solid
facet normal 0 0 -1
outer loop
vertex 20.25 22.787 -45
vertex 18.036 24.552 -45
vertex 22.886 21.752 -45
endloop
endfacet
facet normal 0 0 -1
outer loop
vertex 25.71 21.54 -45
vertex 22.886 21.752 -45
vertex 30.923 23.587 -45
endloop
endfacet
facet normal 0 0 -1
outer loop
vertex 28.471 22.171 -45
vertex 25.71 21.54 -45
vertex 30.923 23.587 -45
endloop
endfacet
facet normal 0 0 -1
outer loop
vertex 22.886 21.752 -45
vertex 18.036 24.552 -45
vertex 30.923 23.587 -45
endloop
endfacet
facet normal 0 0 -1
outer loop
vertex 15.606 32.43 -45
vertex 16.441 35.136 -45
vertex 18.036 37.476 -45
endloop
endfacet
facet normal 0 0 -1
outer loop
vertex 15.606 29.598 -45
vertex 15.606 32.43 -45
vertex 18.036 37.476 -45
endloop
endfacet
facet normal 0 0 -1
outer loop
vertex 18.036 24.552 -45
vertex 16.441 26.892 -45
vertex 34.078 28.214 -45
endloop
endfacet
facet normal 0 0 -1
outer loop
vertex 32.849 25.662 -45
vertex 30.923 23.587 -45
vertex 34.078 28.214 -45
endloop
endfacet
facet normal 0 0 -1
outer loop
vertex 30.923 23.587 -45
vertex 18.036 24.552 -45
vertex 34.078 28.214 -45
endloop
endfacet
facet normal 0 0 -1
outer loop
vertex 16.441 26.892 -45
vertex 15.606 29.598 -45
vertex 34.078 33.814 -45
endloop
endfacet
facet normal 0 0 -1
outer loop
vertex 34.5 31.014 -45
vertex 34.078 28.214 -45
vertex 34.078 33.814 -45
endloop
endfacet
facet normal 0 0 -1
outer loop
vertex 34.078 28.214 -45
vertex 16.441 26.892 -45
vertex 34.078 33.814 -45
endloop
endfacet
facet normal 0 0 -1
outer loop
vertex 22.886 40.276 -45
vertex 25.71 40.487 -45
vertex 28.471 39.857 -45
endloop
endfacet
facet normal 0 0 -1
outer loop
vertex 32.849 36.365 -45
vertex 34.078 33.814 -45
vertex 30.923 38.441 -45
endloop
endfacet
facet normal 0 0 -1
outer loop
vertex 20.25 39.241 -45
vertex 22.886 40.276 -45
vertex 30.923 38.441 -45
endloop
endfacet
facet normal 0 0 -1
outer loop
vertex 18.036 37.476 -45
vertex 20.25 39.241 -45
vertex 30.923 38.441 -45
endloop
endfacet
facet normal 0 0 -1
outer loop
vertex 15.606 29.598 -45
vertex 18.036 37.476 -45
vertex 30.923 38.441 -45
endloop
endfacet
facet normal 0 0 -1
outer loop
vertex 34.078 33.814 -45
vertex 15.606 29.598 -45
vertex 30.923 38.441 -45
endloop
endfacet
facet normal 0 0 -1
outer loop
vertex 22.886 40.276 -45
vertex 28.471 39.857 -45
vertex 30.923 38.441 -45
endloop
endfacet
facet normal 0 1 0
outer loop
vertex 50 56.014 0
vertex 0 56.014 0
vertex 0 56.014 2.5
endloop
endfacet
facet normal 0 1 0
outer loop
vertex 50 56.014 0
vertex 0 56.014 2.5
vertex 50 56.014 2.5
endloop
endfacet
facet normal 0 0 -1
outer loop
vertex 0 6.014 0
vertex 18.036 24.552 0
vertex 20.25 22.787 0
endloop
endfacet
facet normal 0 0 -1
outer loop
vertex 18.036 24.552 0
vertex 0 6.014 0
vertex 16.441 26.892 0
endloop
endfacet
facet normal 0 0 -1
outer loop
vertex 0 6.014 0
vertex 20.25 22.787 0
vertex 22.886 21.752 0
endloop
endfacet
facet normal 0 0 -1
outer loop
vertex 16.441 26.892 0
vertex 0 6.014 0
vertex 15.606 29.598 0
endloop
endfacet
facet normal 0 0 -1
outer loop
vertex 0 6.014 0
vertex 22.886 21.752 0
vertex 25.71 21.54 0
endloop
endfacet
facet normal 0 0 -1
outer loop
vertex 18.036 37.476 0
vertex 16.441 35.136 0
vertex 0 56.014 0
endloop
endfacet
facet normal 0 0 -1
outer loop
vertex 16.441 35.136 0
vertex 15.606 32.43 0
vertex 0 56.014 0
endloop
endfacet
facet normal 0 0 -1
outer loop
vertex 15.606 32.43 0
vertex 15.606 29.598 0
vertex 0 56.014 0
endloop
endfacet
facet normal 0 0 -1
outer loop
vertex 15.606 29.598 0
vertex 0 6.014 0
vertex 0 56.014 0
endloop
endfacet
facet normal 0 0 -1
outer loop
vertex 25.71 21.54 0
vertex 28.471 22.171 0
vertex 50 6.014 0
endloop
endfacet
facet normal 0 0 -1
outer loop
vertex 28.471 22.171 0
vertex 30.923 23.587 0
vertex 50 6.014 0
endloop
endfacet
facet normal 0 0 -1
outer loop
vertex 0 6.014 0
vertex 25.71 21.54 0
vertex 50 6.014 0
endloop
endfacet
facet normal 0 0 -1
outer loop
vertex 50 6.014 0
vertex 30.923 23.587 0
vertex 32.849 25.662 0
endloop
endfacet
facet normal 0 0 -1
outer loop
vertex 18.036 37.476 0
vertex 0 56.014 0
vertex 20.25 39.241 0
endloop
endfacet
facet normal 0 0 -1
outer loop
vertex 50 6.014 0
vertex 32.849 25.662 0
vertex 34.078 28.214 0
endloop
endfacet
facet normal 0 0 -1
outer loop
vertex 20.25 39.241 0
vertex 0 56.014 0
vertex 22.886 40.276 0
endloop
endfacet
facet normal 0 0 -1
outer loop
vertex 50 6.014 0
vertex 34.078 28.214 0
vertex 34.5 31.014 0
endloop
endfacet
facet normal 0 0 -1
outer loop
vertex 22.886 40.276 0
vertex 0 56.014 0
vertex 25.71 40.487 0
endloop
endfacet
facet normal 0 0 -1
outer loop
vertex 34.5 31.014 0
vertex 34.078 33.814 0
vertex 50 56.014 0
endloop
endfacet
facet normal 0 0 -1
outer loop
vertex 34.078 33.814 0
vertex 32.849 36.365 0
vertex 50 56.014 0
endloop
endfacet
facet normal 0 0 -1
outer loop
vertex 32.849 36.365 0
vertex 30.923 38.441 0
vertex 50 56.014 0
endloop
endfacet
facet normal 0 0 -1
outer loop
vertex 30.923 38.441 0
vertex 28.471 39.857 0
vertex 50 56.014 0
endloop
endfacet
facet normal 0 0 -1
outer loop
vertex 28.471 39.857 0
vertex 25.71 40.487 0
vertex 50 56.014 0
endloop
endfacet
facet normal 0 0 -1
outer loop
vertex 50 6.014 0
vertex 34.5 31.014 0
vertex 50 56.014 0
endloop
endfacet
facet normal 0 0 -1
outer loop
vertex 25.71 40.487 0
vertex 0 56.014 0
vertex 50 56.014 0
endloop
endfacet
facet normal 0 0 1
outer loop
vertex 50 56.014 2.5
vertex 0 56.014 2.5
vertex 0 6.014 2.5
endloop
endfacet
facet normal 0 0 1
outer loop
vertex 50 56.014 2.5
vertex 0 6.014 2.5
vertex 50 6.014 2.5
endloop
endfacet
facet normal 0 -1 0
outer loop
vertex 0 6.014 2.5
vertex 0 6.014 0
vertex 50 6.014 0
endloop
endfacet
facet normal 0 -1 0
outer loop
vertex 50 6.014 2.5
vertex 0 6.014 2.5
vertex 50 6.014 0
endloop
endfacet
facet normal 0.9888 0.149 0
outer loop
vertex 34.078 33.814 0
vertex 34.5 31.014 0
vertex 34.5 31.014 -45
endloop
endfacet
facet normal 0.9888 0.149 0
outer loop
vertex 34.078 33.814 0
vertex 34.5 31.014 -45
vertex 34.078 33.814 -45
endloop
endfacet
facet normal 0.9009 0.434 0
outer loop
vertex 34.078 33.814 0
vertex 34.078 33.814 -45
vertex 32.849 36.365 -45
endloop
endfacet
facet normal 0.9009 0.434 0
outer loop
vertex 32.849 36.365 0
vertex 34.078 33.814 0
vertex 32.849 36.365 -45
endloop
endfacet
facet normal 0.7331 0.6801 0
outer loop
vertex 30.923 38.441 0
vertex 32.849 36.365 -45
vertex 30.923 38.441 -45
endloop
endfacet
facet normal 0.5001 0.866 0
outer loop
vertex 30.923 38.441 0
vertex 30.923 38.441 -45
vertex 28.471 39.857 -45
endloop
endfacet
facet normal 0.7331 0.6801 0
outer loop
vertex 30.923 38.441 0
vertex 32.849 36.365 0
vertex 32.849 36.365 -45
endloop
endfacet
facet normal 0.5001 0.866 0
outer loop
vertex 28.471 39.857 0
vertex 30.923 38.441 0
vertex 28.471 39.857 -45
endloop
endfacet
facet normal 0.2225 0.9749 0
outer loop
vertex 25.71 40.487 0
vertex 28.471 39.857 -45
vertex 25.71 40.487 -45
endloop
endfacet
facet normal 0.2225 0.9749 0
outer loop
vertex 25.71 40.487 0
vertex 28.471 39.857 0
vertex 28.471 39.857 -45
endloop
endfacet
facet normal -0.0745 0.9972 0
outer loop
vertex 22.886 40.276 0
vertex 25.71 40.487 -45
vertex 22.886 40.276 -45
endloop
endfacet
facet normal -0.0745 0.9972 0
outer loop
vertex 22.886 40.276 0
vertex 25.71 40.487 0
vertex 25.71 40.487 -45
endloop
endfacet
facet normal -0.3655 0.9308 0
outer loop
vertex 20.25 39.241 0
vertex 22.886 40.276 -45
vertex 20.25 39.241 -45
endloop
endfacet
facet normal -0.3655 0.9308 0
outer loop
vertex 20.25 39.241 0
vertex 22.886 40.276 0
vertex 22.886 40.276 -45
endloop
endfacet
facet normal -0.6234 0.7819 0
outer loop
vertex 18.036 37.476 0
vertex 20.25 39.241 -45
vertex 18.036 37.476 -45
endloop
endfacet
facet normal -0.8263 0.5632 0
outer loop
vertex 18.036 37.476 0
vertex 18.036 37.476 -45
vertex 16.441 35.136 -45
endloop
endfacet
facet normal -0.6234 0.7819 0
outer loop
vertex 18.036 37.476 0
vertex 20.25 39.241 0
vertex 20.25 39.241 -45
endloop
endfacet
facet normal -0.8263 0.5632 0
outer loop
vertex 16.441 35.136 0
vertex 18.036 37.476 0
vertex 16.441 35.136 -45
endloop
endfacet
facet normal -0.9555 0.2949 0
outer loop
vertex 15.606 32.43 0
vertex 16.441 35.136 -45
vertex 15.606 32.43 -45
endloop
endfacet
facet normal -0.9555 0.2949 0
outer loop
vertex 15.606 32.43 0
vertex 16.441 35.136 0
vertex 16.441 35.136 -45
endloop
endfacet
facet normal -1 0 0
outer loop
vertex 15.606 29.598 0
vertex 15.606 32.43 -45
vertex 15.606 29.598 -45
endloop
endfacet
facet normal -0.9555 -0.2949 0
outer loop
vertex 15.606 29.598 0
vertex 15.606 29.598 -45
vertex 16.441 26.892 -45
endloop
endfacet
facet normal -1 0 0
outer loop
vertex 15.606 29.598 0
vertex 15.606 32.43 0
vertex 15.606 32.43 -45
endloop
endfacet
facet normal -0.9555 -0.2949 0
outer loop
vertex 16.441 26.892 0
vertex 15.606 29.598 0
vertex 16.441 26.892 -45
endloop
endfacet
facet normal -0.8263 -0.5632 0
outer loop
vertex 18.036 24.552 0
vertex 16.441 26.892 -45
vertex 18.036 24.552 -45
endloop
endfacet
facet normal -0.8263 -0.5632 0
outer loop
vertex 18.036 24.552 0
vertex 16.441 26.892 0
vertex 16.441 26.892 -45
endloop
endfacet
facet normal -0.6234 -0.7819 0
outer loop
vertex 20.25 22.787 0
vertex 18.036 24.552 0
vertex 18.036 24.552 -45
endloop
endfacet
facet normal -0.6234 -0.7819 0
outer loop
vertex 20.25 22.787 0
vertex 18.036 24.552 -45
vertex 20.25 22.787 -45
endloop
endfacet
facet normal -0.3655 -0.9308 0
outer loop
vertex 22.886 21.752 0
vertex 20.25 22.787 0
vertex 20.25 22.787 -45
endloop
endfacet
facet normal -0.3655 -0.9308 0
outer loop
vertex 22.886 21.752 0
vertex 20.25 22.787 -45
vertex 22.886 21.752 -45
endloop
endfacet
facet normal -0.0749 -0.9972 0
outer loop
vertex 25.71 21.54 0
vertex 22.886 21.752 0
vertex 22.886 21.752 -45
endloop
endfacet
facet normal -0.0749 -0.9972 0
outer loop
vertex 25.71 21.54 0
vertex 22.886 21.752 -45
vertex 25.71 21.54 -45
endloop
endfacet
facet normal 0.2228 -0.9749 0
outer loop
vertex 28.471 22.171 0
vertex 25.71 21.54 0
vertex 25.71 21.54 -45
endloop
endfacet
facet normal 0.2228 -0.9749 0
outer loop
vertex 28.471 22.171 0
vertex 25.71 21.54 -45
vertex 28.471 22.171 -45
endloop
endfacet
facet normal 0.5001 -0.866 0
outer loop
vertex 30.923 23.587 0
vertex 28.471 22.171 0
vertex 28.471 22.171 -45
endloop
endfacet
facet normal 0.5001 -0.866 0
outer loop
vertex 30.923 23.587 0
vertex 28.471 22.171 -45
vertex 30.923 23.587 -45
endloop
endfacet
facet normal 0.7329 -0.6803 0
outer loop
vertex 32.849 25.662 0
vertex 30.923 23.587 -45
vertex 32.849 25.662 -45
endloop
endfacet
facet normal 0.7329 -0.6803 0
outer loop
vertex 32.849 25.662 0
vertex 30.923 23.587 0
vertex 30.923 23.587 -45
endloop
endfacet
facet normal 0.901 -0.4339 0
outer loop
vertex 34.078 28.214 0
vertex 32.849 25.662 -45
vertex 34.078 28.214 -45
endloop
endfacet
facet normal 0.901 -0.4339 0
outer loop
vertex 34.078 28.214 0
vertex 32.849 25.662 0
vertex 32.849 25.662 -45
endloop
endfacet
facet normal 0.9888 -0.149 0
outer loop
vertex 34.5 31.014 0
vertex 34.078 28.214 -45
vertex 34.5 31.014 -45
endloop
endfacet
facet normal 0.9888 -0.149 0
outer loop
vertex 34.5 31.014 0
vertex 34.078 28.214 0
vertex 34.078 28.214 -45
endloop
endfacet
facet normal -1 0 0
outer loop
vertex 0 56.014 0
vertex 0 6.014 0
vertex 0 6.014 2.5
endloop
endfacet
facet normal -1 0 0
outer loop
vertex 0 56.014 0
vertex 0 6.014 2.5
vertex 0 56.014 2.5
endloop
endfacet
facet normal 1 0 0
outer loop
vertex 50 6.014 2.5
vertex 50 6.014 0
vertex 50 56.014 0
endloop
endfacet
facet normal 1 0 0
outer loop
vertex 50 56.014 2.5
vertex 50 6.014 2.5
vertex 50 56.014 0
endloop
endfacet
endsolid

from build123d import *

# Parameters (mm, degrees)
F0_W     = 50
F0_H     = 50
F0_R     = 9.5
F1_DEPTH = 2.5
F2_DEPTH = 45


with BuildPart() as f1:
    # F0 (on Top) → F1 (new body)
    with BuildSketch(Plane.XY):
        with Locations((25, 31.013934)):
            Rectangle(F0_W, F0_H)
        with Locations((25, 31.013934)):
            Circle(F0_R, mode=Mode.SUBTRACT)
        with Locations((25, 31.013934)):
            Circle(F0_R)
    extrude(amount=F1_DEPTH)

    # F0 (on Top) → F2 (join)
    with BuildSketch(Plane.XY):
        with Locations((25, 31.013934)):
            Circle(F0_R)
    extrude(amount=-F2_DEPTH)


solid = f1.part
